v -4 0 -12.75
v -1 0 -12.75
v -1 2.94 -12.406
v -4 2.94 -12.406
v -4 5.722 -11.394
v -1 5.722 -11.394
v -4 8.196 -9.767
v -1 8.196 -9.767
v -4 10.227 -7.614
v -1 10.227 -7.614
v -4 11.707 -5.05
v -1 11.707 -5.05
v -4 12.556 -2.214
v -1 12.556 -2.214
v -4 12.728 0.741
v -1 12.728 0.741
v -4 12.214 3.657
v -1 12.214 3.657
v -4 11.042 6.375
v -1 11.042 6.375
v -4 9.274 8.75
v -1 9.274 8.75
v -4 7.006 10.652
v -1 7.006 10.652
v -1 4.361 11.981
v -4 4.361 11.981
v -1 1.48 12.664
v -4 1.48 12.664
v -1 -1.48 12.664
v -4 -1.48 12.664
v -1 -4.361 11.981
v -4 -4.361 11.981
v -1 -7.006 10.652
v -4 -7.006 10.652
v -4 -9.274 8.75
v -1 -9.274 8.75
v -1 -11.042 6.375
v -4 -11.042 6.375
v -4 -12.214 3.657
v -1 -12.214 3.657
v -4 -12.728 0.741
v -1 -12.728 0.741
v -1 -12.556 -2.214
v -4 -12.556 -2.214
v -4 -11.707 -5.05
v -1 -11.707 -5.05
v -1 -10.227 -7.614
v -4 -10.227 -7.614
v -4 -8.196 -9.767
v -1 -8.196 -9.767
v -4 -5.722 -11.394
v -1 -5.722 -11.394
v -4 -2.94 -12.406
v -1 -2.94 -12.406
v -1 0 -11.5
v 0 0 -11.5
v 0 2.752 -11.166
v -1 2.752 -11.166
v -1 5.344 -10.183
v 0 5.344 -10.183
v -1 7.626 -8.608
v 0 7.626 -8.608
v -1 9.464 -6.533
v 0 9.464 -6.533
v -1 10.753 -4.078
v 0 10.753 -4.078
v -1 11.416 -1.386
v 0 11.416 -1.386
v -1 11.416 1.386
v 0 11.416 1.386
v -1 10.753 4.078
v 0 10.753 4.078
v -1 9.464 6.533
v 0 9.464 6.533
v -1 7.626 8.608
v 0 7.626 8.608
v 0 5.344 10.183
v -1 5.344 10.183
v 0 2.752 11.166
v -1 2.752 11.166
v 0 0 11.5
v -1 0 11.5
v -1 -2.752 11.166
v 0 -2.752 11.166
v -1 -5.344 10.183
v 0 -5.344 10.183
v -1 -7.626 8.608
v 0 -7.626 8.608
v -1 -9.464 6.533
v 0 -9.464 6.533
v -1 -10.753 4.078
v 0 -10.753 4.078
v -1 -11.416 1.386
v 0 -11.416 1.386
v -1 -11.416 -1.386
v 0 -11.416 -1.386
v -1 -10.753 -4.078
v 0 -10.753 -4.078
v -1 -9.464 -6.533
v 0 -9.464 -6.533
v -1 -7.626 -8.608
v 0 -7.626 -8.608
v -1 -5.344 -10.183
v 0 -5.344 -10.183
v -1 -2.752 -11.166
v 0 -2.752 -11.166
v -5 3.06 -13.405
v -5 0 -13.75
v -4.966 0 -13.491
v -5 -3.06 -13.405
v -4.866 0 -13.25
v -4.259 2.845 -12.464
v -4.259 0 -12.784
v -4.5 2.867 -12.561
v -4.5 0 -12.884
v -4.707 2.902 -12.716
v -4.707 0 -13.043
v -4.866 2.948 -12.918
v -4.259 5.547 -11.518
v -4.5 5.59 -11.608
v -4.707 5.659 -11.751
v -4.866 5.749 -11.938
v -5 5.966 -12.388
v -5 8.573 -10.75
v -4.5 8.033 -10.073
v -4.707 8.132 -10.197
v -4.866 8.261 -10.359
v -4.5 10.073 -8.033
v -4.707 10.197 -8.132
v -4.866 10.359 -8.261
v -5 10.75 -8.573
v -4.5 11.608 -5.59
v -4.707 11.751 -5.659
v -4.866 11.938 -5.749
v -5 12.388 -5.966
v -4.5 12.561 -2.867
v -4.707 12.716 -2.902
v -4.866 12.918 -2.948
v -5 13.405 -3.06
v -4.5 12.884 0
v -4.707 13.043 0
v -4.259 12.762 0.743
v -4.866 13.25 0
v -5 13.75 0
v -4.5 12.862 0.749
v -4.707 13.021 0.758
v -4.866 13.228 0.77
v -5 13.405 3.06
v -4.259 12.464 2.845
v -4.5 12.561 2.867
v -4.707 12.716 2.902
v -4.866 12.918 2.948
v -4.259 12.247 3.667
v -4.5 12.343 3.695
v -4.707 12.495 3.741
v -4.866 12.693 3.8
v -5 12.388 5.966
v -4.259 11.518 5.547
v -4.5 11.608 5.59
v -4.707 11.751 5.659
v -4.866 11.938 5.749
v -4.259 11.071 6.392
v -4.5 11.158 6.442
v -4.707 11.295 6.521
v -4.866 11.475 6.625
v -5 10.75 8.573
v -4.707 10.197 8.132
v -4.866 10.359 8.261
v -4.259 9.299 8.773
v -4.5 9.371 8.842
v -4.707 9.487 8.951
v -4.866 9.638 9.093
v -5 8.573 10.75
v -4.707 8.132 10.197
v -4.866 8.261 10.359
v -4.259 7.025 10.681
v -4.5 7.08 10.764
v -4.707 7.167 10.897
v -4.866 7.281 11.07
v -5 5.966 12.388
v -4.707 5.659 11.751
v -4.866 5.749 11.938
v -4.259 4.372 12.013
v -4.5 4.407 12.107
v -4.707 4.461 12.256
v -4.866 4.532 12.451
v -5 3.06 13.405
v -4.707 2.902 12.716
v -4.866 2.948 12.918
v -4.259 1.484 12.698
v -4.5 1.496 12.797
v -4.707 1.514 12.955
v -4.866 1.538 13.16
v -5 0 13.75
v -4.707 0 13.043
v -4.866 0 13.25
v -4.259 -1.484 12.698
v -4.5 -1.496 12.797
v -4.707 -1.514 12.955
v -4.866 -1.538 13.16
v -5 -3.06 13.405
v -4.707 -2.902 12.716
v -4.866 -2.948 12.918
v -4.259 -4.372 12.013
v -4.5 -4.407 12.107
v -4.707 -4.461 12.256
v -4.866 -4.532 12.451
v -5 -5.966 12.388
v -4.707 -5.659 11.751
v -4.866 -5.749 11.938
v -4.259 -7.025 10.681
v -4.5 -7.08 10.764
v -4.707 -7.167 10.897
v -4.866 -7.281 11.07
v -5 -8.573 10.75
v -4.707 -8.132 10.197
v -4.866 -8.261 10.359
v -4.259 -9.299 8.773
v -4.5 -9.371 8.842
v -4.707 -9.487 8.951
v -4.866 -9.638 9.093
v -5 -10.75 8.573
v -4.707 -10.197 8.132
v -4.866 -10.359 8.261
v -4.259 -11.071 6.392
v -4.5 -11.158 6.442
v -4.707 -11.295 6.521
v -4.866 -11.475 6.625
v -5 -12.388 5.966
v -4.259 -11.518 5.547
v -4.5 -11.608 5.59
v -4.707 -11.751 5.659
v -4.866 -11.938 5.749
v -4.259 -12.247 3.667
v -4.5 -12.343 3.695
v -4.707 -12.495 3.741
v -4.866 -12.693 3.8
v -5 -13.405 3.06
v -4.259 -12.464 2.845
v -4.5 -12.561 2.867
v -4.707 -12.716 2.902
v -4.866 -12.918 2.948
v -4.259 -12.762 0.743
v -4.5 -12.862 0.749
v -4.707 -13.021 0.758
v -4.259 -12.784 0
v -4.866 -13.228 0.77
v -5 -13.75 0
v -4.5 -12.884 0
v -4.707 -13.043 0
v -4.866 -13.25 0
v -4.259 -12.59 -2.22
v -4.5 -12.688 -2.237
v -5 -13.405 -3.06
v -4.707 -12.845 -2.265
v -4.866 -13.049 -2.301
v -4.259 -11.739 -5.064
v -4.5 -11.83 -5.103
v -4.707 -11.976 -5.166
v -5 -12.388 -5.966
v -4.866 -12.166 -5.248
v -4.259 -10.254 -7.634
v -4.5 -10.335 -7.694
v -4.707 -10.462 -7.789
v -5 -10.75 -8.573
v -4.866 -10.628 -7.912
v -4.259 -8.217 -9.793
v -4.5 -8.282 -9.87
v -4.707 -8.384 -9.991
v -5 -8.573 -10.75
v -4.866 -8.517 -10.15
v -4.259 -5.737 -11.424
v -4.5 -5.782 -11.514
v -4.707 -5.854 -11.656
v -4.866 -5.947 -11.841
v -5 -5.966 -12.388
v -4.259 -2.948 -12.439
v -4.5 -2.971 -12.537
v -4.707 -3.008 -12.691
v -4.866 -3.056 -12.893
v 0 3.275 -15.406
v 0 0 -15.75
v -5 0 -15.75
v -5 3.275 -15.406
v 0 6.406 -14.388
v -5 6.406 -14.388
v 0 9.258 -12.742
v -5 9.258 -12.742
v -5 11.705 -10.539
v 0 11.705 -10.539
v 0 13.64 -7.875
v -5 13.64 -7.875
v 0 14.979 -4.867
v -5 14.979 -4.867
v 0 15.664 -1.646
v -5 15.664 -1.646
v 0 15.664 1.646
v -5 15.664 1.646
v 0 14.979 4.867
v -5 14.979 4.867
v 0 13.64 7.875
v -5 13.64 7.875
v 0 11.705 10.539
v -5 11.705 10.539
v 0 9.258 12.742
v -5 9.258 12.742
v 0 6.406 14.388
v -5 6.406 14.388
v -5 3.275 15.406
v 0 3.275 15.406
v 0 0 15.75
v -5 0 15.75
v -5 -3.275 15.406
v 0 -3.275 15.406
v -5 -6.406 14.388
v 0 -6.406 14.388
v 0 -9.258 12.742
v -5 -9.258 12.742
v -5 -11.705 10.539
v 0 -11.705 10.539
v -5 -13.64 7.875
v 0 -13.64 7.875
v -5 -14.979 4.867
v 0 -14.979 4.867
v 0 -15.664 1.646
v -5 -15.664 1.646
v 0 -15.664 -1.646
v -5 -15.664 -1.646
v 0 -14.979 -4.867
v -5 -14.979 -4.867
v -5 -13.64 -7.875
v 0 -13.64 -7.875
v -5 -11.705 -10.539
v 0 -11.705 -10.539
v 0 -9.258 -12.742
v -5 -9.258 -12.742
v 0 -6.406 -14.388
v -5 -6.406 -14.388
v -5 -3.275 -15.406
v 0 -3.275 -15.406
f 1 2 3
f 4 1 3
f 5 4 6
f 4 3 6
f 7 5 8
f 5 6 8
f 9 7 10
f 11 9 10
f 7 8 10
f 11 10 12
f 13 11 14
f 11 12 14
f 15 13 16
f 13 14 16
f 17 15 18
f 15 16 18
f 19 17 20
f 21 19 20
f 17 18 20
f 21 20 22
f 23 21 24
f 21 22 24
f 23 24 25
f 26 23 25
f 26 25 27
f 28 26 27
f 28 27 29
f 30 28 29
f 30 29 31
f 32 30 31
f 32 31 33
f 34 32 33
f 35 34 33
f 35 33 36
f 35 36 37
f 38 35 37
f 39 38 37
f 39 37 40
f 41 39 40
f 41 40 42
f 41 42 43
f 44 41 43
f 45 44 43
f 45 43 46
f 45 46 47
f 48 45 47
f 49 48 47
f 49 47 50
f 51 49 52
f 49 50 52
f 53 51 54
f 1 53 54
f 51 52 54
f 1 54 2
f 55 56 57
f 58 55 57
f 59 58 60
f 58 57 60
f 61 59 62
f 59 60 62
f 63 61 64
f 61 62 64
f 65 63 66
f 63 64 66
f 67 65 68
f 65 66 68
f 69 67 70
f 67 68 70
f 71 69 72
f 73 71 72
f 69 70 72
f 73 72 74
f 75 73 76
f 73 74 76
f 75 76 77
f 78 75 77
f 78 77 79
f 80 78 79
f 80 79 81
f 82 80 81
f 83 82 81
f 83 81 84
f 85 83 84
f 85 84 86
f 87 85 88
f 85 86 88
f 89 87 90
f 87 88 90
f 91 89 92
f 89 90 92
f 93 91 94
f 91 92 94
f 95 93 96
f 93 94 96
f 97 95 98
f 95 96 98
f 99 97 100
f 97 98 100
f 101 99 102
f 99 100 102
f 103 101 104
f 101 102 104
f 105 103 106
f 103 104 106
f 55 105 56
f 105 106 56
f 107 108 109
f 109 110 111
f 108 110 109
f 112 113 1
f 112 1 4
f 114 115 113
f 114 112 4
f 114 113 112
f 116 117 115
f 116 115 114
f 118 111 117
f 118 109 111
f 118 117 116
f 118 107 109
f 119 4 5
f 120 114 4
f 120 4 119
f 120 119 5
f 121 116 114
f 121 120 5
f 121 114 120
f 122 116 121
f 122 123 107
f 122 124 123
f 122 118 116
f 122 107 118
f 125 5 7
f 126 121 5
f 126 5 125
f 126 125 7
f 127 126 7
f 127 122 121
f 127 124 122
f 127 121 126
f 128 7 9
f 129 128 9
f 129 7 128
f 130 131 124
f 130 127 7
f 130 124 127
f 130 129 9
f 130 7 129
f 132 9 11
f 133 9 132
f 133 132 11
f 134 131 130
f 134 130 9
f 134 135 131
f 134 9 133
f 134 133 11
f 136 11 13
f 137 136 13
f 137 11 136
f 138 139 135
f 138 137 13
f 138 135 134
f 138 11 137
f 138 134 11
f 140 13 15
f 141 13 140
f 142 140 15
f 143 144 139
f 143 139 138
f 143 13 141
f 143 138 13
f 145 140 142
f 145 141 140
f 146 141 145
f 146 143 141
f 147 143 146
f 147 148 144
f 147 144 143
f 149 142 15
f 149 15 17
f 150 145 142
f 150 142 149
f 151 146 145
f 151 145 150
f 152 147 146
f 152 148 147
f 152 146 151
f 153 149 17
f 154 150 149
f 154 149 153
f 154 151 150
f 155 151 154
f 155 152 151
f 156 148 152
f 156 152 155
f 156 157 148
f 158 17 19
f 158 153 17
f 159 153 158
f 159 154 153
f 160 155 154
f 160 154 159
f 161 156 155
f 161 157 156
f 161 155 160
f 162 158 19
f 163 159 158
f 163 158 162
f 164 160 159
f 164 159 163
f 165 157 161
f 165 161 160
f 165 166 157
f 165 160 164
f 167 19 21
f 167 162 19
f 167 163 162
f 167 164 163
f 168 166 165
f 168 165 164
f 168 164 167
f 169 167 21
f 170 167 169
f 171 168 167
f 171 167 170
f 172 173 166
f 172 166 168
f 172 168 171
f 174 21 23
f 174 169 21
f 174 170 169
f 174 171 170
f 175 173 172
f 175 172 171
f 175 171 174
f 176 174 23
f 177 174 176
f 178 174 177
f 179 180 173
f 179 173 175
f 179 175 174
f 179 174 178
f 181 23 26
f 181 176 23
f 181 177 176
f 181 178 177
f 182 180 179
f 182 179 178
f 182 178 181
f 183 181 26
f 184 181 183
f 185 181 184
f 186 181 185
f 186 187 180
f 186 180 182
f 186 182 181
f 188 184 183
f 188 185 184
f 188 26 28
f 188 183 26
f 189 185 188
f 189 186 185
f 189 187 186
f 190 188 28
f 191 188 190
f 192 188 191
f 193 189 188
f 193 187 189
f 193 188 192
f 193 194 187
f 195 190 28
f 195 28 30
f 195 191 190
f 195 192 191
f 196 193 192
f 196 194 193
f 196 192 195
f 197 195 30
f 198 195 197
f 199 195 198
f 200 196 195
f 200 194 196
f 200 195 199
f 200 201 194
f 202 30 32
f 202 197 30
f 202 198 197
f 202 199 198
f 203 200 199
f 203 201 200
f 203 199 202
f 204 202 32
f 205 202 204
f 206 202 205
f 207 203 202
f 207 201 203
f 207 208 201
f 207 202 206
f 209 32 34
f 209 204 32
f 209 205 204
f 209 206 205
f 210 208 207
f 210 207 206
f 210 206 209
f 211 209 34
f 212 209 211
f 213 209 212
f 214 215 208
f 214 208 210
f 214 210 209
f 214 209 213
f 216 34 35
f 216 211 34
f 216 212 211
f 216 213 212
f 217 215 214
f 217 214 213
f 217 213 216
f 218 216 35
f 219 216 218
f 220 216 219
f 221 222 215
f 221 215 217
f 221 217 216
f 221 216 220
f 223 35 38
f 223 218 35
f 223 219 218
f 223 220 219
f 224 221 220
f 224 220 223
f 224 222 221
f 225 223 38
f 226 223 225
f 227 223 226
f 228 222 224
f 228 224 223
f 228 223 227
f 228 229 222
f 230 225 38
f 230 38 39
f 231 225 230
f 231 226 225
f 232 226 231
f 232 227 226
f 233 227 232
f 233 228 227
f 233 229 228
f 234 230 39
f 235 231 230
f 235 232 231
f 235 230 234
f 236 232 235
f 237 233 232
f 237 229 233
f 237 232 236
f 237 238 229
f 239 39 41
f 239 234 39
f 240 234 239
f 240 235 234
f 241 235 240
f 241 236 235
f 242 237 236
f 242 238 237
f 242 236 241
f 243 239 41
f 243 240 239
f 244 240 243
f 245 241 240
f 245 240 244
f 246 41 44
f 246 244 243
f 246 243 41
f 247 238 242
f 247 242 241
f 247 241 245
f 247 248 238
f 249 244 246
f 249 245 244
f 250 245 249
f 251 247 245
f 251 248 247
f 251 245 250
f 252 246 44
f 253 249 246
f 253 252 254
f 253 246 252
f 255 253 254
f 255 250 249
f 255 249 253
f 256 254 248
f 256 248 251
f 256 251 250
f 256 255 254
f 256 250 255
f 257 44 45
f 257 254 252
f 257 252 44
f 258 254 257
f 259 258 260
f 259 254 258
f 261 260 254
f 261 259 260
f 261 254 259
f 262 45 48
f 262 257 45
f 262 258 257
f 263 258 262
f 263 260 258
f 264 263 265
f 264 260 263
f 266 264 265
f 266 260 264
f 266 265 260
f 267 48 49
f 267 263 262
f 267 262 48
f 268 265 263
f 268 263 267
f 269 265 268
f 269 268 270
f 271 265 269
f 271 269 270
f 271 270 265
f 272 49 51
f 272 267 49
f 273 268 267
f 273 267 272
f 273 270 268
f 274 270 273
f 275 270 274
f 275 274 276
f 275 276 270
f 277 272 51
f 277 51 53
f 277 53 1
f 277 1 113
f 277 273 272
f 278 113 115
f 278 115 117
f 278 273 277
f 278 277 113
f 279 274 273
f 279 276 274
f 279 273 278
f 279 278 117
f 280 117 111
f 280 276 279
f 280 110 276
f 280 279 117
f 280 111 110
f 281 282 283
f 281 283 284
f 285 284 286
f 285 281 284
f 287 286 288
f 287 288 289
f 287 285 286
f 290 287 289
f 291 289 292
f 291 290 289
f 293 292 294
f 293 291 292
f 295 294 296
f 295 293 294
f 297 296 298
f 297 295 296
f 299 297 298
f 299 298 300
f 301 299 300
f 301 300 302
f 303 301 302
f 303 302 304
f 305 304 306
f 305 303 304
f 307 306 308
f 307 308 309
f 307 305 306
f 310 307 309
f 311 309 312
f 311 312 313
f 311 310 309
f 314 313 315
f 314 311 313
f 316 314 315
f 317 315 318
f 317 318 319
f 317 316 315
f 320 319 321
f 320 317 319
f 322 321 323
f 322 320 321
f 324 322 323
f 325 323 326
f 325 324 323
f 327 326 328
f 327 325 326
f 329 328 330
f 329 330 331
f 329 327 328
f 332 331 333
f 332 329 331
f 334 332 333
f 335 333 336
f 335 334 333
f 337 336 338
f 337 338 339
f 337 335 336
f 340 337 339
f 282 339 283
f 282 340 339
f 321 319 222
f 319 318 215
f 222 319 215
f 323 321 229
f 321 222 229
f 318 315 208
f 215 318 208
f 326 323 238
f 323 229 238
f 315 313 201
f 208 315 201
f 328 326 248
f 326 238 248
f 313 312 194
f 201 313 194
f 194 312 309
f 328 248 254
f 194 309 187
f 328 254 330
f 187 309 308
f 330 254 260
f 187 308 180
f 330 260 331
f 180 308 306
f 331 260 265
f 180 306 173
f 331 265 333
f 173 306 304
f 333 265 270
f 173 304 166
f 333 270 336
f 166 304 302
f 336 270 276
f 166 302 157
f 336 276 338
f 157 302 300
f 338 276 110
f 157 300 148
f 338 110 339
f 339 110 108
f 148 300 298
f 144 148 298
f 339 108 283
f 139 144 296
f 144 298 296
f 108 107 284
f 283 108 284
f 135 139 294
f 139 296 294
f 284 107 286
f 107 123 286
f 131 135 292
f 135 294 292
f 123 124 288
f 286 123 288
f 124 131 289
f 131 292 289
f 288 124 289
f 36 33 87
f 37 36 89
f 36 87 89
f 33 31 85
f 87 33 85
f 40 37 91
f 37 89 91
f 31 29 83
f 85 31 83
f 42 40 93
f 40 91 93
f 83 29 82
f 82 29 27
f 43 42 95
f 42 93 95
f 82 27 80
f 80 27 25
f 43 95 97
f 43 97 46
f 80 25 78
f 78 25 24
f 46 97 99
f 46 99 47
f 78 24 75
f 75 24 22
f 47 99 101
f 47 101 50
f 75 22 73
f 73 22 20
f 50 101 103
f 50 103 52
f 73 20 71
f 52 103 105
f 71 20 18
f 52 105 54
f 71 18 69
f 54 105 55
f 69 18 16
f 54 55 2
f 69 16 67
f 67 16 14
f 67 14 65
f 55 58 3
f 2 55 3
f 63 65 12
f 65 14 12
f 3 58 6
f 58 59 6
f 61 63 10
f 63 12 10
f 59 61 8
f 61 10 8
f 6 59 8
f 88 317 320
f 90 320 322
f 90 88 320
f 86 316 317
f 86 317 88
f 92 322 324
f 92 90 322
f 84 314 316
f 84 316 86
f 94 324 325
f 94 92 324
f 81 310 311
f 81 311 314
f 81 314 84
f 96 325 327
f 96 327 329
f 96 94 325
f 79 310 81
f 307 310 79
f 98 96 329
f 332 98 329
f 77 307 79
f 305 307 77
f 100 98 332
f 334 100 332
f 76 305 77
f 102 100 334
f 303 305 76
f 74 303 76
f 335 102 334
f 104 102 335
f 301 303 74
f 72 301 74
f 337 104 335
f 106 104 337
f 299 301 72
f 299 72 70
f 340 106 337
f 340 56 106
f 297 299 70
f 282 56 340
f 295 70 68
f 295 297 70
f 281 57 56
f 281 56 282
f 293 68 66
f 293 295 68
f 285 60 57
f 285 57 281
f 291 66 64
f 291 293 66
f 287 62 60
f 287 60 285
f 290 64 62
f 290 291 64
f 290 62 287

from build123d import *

# Parameters (mm, degrees)
SKETCH1_R            = 15.75
SKETCH1_R_2          = 12.75
BOSS_EXTRUDE1_DEPTH  = 5
FILLET3_R            = 1
SKETCH1_3_R          = 12.75
SKETCH1_3_R_2        = 11.5
BOSS_EXTRUDE29_DEPTH = 1


with BuildPart() as part:
    # Sketch1 → Boss-Extrude1 (new body)
    with BuildSketch(Plane(origin=(0, 0, 0), x_dir=(0, 0, -1), z_dir=(1, 0, 0))):
        Circle(SKETCH1_R)
        Circle(SKETCH1_R_2, mode=Mode.SUBTRACT)
    extrude(amount=-BOSS_EXTRUDE1_DEPTH)

    # Fillet3
    fillet3_edges = [part.edges().sort_by_distance(p)[0] for p in [
        (-5, 0, 12.75),
    ]]
    fillet(fillet3_edges, radius=FILLET3_R)

    # Sketch1<3> → Boss-Extrude29 (add)
    with BuildSketch(Plane(origin=(0, 0, 0), x_dir=(0, 0, -1), z_dir=(1, 0, 0))):
        Circle(SKETCH1_3_R)
        Circle(SKETCH1_3_R_2, mode=Mode.SUBTRACT)
    extrude(amount=-BOSS_EXTRUDE29_DEPTH)


solid = part.part
